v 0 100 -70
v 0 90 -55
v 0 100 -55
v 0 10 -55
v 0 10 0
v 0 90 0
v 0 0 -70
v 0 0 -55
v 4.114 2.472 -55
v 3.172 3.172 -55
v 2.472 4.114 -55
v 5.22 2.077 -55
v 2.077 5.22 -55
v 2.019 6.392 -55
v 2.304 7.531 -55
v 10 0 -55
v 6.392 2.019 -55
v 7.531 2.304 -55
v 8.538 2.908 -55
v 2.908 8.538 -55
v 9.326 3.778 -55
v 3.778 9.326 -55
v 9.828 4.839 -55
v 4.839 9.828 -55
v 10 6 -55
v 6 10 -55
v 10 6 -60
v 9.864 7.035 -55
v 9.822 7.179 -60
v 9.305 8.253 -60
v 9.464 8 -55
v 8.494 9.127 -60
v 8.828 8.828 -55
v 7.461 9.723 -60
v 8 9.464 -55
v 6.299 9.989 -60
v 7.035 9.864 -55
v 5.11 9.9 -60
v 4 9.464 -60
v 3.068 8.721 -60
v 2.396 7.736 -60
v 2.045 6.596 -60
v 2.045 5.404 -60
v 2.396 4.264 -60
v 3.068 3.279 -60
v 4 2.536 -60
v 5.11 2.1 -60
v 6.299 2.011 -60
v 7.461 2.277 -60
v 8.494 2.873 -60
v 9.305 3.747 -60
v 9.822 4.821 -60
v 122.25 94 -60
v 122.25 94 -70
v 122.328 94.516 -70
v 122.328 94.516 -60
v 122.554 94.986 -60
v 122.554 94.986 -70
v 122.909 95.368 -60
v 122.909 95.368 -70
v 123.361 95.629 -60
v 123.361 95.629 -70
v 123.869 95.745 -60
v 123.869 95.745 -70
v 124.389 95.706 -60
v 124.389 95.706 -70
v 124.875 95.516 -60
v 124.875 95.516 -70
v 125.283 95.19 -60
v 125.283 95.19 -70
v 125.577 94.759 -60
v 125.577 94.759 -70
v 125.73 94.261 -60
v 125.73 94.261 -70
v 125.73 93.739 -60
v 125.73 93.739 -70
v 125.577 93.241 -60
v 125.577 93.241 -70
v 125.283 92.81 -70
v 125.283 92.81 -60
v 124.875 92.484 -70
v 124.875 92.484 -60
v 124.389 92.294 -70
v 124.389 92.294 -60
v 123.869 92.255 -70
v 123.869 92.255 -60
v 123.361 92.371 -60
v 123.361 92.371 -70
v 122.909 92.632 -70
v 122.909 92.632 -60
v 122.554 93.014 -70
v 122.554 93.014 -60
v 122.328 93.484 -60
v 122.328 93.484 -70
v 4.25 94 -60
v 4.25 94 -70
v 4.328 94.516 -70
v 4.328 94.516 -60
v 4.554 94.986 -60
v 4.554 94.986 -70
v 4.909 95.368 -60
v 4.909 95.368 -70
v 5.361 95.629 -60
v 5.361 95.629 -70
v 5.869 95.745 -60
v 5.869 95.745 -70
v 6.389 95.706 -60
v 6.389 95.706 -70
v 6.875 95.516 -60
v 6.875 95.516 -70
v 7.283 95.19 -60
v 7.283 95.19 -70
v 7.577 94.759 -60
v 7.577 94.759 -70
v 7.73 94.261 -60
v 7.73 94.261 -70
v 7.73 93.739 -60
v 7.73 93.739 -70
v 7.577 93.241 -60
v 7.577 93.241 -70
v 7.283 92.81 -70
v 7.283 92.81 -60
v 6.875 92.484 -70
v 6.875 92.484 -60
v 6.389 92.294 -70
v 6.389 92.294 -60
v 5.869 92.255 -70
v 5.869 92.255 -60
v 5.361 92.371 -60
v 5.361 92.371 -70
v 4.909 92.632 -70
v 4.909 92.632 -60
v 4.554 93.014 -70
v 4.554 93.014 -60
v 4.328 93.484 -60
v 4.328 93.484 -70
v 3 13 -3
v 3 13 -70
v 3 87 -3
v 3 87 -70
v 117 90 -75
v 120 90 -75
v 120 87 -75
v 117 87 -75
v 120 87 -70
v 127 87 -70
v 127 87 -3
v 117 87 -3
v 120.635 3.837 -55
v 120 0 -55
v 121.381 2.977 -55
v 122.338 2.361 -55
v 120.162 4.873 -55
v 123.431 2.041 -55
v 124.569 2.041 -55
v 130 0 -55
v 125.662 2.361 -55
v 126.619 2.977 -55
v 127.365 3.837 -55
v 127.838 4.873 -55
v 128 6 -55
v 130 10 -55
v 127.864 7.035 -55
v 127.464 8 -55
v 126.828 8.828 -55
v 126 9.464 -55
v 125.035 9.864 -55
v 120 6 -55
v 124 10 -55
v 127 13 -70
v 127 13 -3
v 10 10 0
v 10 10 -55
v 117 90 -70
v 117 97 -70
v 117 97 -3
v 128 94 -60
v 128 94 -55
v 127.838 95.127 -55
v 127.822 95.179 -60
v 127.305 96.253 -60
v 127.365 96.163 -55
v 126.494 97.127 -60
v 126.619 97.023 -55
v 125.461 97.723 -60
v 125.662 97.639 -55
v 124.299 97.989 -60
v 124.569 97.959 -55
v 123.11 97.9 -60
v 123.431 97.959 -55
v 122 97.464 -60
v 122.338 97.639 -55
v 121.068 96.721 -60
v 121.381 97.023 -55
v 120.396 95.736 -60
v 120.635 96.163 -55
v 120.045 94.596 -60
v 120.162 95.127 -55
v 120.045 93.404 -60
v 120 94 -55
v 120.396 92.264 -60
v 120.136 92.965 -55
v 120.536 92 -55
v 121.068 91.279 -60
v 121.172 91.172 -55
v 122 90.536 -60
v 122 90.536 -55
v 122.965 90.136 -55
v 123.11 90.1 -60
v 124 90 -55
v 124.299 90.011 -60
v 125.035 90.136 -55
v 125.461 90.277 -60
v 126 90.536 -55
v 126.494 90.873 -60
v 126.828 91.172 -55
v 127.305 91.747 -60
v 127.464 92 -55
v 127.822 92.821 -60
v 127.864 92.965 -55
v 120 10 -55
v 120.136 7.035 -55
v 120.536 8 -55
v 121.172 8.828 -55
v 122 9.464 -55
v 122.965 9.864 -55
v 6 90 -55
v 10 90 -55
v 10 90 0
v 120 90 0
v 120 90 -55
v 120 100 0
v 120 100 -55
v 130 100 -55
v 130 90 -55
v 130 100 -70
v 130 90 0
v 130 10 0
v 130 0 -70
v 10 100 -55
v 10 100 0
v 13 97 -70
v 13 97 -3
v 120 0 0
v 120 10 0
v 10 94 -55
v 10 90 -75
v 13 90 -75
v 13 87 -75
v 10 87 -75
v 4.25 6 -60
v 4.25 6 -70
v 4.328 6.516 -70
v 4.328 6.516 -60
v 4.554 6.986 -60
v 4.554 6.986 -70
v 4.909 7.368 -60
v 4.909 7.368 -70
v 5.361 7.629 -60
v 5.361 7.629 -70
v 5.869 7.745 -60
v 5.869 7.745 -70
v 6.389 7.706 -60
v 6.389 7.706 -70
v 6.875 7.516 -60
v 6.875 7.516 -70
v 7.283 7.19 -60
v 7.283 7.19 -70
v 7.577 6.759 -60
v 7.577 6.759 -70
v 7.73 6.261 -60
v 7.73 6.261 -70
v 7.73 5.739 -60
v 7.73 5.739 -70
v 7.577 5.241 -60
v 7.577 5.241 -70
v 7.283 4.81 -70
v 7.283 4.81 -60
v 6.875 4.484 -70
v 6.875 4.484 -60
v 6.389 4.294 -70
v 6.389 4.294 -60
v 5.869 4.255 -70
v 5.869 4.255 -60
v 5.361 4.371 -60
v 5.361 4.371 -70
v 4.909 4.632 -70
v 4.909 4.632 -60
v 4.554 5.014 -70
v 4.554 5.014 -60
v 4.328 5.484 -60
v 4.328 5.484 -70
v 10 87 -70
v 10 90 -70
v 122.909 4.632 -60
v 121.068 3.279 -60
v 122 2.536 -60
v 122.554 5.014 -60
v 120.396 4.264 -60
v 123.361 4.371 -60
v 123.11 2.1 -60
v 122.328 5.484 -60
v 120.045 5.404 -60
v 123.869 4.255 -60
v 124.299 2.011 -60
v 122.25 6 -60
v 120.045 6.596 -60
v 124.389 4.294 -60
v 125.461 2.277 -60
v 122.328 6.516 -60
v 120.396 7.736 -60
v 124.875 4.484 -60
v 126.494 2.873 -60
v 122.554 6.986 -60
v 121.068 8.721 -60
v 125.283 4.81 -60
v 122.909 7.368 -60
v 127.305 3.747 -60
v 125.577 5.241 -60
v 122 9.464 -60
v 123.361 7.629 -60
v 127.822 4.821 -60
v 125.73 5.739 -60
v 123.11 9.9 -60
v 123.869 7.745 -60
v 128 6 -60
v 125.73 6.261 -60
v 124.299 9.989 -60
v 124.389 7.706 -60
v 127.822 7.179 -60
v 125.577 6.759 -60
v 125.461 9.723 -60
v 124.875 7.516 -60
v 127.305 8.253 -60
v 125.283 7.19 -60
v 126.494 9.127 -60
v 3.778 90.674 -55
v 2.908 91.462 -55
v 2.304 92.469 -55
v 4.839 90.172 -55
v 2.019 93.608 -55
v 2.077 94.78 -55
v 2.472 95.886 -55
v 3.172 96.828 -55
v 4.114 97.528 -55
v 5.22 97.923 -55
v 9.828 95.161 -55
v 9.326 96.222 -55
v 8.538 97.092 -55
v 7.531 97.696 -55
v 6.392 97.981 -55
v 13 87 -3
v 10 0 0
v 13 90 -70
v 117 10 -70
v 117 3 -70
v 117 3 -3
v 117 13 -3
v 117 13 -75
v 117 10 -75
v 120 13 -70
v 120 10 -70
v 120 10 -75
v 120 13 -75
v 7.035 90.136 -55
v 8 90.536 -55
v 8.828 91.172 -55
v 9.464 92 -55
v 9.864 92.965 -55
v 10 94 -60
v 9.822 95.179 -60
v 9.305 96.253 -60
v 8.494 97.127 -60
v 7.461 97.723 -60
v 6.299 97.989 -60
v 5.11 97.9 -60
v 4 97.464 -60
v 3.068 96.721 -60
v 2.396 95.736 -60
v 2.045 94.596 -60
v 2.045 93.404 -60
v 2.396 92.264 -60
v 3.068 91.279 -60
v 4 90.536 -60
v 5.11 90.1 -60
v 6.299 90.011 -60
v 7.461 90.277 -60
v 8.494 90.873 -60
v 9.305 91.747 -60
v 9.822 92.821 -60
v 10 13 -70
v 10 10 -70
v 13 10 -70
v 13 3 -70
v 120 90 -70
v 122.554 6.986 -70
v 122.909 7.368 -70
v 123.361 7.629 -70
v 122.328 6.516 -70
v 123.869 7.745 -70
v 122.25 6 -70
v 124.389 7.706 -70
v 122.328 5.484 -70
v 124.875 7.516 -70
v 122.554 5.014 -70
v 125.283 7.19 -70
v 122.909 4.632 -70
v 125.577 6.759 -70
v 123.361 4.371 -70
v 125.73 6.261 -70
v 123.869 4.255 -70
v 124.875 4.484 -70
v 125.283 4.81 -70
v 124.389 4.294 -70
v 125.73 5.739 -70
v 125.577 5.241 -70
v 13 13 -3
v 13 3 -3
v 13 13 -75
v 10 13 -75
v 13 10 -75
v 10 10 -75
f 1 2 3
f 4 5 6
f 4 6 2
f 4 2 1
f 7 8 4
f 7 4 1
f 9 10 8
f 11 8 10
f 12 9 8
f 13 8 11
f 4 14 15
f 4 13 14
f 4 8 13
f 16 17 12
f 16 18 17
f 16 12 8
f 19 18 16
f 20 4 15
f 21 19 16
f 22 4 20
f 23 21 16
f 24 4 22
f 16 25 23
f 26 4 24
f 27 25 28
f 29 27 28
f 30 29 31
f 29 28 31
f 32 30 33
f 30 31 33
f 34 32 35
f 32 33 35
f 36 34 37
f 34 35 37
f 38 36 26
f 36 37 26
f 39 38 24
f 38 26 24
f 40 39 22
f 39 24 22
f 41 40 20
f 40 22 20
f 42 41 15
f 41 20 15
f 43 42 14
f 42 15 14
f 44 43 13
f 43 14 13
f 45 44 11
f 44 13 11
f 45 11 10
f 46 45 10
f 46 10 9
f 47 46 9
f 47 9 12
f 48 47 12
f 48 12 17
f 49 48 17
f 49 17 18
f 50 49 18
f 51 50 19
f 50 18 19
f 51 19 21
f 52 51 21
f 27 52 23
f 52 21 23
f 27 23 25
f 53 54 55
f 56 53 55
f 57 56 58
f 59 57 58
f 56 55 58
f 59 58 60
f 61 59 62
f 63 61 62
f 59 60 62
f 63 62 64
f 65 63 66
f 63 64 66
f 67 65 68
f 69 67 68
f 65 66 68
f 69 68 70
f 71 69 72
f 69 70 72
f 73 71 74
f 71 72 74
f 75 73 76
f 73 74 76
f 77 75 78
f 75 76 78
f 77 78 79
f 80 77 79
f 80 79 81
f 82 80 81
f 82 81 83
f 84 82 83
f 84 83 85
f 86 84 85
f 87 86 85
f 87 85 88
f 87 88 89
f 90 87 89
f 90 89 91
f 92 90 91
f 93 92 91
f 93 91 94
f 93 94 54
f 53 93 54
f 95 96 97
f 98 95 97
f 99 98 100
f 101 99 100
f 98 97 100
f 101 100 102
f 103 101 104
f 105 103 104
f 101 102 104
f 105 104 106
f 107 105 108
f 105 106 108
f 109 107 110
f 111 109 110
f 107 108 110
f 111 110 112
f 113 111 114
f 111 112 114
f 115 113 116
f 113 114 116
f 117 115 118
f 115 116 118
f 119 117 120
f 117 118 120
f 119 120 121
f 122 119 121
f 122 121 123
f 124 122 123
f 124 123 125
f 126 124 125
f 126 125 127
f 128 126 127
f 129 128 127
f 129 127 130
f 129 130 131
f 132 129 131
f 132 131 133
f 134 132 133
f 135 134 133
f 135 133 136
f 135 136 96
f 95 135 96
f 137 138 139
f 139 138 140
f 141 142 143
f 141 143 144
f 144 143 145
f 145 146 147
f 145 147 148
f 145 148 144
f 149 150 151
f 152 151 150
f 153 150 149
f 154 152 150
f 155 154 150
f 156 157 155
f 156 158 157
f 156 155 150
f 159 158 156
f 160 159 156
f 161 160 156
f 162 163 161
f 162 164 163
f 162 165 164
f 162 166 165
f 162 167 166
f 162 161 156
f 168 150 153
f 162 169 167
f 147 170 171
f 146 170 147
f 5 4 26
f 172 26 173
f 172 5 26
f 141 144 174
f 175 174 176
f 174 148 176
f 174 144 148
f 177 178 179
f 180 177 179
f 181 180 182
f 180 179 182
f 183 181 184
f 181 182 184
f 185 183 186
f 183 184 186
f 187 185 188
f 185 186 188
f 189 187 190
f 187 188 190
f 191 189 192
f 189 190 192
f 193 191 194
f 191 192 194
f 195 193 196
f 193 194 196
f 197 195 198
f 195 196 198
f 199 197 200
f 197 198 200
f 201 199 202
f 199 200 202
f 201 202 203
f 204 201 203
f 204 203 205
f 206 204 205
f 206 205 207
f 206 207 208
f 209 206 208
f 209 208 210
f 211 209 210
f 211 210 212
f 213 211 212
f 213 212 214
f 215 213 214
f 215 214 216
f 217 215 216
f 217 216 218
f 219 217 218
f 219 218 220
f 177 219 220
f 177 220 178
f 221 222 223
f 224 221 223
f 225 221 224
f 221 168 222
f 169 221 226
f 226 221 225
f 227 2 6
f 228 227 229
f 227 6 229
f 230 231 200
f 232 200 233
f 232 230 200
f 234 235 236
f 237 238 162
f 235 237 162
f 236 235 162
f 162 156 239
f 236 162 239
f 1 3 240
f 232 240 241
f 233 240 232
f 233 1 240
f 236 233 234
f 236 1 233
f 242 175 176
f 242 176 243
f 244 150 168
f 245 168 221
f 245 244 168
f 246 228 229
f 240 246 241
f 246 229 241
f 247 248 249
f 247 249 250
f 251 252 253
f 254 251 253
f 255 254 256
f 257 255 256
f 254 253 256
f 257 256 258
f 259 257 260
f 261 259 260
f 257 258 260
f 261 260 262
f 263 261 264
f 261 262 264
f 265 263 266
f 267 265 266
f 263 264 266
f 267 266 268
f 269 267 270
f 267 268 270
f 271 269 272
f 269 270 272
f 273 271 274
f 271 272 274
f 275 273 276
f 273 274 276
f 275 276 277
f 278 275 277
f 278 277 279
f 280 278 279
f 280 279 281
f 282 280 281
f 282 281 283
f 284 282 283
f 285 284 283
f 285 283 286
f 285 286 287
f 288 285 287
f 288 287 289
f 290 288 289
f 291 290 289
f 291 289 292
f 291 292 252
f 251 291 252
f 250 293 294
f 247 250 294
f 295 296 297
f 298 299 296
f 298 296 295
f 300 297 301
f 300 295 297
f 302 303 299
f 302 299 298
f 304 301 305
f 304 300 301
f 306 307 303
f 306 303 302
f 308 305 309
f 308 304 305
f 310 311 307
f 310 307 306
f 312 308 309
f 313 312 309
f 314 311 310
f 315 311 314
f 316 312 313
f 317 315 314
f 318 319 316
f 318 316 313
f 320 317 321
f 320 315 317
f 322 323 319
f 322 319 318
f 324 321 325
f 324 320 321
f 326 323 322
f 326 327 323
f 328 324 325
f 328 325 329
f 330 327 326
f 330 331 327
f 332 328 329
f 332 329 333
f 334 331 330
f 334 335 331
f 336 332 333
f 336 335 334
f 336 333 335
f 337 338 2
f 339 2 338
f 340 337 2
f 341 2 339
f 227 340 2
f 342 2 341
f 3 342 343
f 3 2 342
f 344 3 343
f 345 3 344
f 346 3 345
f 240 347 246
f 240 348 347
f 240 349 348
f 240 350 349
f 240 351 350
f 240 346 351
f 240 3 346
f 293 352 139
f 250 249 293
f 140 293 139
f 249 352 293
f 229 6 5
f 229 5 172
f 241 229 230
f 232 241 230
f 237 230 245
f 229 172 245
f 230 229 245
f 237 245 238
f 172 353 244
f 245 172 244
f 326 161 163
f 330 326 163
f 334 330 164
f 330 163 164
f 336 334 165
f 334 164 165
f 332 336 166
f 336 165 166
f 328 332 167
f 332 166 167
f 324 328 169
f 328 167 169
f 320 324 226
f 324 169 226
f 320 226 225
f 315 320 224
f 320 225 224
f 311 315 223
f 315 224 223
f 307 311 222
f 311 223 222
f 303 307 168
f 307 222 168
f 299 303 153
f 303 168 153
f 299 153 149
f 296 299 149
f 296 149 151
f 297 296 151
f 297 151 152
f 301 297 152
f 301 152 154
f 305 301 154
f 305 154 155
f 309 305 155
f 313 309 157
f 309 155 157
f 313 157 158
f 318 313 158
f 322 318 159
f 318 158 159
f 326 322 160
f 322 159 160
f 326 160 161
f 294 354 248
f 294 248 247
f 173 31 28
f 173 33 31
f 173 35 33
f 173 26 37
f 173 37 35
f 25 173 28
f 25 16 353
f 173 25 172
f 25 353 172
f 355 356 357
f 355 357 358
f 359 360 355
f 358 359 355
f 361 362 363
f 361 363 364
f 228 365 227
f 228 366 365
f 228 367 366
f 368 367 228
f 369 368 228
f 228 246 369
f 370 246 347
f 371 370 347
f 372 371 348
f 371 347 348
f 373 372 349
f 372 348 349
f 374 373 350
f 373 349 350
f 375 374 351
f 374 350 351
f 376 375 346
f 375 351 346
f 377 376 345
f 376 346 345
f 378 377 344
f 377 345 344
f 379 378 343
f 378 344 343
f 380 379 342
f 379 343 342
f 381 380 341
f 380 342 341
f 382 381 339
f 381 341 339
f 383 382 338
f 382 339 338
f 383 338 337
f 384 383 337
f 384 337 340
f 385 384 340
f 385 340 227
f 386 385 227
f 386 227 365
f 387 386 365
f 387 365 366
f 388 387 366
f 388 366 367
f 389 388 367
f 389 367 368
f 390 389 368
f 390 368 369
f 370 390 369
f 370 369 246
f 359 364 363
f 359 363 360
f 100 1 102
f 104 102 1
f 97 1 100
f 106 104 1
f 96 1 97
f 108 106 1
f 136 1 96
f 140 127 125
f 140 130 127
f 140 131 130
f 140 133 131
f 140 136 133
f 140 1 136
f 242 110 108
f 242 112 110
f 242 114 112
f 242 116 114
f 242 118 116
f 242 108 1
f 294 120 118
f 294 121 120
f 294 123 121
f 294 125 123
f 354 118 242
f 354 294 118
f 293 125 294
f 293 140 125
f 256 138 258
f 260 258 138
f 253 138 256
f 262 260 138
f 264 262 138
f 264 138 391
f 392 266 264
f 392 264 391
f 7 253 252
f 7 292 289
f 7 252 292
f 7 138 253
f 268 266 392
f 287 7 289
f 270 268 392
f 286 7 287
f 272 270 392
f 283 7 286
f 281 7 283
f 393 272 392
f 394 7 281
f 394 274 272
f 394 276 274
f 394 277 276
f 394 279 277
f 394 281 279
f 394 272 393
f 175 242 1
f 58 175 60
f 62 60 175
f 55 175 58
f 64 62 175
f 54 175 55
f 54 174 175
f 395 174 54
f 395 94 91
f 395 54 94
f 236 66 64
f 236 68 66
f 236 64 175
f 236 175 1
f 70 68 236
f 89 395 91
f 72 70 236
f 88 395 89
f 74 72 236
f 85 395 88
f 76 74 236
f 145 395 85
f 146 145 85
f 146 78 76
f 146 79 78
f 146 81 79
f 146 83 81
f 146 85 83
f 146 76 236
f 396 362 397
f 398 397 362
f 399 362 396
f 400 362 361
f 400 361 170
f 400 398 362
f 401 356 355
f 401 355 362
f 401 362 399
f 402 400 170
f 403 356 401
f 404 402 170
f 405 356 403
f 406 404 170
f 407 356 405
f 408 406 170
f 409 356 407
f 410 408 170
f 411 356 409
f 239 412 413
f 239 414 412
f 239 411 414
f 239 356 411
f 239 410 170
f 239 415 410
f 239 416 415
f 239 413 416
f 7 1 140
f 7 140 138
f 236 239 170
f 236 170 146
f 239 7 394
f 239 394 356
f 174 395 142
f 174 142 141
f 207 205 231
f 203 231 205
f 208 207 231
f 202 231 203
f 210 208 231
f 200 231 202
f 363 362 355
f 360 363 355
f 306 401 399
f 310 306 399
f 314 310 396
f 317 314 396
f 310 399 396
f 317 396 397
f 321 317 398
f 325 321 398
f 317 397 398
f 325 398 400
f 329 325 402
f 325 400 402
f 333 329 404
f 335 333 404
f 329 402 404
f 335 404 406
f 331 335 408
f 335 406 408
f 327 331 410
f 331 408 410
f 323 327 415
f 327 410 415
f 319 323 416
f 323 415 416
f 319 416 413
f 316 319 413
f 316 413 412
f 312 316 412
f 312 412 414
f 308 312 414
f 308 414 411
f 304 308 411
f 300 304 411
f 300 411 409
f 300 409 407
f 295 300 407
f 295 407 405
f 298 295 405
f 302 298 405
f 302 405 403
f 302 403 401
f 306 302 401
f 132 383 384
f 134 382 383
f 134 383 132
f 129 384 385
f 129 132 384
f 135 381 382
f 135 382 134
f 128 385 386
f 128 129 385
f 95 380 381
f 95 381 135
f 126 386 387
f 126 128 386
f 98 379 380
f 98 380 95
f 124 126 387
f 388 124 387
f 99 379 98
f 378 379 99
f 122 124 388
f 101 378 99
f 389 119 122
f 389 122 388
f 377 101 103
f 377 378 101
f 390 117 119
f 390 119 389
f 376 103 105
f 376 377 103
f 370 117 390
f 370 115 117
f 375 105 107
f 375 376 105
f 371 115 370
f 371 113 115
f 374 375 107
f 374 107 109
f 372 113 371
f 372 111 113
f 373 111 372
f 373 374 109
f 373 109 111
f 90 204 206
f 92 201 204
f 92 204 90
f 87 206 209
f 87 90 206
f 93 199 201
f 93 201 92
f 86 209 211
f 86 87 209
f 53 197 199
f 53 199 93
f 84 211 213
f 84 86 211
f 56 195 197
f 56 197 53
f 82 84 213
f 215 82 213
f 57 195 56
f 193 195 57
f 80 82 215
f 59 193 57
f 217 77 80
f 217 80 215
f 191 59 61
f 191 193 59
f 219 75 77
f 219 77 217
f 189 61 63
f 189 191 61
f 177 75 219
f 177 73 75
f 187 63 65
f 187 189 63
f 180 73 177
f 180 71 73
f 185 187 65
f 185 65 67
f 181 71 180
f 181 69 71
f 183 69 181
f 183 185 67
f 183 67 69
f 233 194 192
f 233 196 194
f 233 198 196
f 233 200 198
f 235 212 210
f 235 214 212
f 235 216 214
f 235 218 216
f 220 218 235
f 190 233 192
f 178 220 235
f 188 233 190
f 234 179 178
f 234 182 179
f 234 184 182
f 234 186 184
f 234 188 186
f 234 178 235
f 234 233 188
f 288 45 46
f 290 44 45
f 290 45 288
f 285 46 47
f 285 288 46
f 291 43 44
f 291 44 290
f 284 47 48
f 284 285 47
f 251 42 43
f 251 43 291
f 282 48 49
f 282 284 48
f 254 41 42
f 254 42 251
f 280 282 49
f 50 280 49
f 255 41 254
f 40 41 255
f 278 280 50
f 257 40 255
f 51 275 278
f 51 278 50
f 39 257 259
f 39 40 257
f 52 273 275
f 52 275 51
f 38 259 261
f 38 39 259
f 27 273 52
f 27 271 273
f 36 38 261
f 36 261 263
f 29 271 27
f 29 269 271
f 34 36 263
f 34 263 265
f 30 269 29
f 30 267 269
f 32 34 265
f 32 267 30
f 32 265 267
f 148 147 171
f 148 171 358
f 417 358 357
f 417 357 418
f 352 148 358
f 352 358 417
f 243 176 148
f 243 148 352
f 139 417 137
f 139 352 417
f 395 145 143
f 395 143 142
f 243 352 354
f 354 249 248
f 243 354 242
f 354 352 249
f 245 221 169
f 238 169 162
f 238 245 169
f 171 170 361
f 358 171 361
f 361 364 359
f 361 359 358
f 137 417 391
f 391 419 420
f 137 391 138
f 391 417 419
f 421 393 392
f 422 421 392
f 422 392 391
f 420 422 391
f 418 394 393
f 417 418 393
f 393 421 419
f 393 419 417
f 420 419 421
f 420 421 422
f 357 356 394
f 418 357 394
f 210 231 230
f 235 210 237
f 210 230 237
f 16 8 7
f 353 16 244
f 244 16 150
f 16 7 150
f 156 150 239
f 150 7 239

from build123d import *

# Parameters (mm, degrees)
SKETCH2_W           = 130
SKETCH2_H           = 70
BOSS_EXTRUDE1_DEPTH = 100
SKETCH3_W           = 104
SKETCH3_H           = 74
CUT_EXTRUDE1_DEPTH  = 67
SKETCH4_W           = 10
SKETCH4_H           = 10
CUT_EXTRUDE2_DEPTH  = 55
SKETCH5_W           = 104
SKETCH5_H           = 10
CUT_EXTRUDE3_DEPTH  = 67
SKETCH6_W           = 10
SKETCH6_H           = 74
CUT_EXTRUDE4_DEPTH  = 67
SKETCH9_R           = 1.75
CUT_EXTRUDE5_DEPTH  = 67
SKETCH10_R          = 4
CUT_EXTRUDE6_DEPTH  = 5
SKETCH12_R          = 4
CUT_EXTRUDE7_DEPTH  = 5
SKETCH13_R          = 4
CUT_EXTRUDE8_DEPTH  = 5
SKETCH14_R          = 4
CUT_EXTRUDE9_DEPTH  = 5
SKETCH15_W          = 3
SKETCH15_H          = 3
BOSS_EXTRUDE2_DEPTH = 5


with BuildPart() as part:
    # Sketch2 → Boss-Extrude1 (new body)
    with BuildSketch(Plane(origin=(0, 0, 0), x_dir=(1, 0, 0), z_dir=(0, 1, 0))):
        with Locations((65, 35)):
            Rectangle(SKETCH2_W, SKETCH2_H)
    extrude(amount=BOSS_EXTRUDE1_DEPTH)

    # Sketch3 → Cut-Extrude1 (cut)
    with BuildSketch(Plane(origin=(0, 0, -70), x_dir=(-1, 0, 0), z_dir=(0, 0, -1))):
        with Locations((-65, 50)):
            Rectangle(SKETCH3_W, SKETCH3_H)
    extrude(amount=-CUT_EXTRUDE1_DEPTH, mode=Mode.SUBTRACT)

    # Sketch4 → Cut-Extrude2 (cut)
    with BuildSketch(Plane.XY):
        with Locations((5, 95)):
            Rectangle(SKETCH4_W, SKETCH4_H)
        with Locations((125, 95)):
            Rectangle(SKETCH4_W, SKETCH4_H)
        with Locations((5, 5)):
            Rectangle(SKETCH4_W, SKETCH4_H)
        with Locations((125, 5)):
            Rectangle(SKETCH4_W, SKETCH4_H)
    extrude(amount=-CUT_EXTRUDE2_DEPTH, mode=Mode.SUBTRACT)

    # Sketch5 → Cut-Extrude3 (cut)
    with BuildSketch(Plane(origin=(0, 0, -70), x_dir=(-1, 0, 0), z_dir=(0, 0, -1))):
        with Locations((-65, 92)):
            Rectangle(SKETCH5_W, SKETCH5_H)
        with Locations((-65, 8)):
            Rectangle(SKETCH5_W, SKETCH5_H)
    extrude(amount=-CUT_EXTRUDE3_DEPTH, mode=Mode.SUBTRACT)

    # Sketch6 → Cut-Extrude4 (cut)
    with BuildSketch(Plane(origin=(0, 0, -70), x_dir=(-1, 0, 0), z_dir=(0, 0, -1))):
        with Locations((-122, 50)):
            Rectangle(SKETCH6_W, SKETCH6_H)
        with Locations((-8, 50)):
            Rectangle(SKETCH6_W, SKETCH6_H)
    extrude(amount=-CUT_EXTRUDE4_DEPTH, mode=Mode.SUBTRACT)

    # Sketch9 → Cut-Extrude5 (cut)
    with BuildSketch(Plane(origin=(0, 0, -70), x_dir=(-1, 0, 0), z_dir=(0, 0, -1))):
        with Locations((-124, 94)):
            Circle(SKETCH9_R)
        with Locations((-124, 6)):
            Circle(SKETCH9_R)
        with Locations((-6, 94)):
            Circle(SKETCH9_R)
        with Locations((-6, 6)):
            Circle(SKETCH9_R)
    extrude(amount=-CUT_EXTRUDE5_DEPTH, mode=Mode.SUBTRACT)

    # Sketch10 → Cut-Extrude6 (cut)
    with BuildSketch(Plane.XY.offset(-55)):
        with Locations((124, 94)):
            Circle(SKETCH10_R)
    extrude(amount=-CUT_EXTRUDE6_DEPTH, mode=Mode.SUBTRACT)

    # Sketch12 → Cut-Extrude7 (cut)
    with BuildSketch(Plane.XY.offset(-55)):
        with Locations((124, 6)):
            Circle(SKETCH12_R)
    extrude(amount=-CUT_EXTRUDE7_DEPTH, mode=Mode.SUBTRACT)

    # Sketch13 → Cut-Extrude8 (cut)
    with BuildSketch(Plane.XY.offset(-55)):
        with Locations((6, 6)):
            Circle(SKETCH13_R)
    extrude(amount=-CUT_EXTRUDE8_DEPTH, mode=Mode.SUBTRACT)

    # Sketch14 → Cut-Extrude9 (cut)
    with BuildSketch(Plane.XY.offset(-55)):
        with Locations((6, 94)):
            Circle(SKETCH14_R)
    extrude(amount=-CUT_EXTRUDE9_DEPTH, mode=Mode.SUBTRACT)

    # Sketch15 → Boss-Extrude2 (add)
    with BuildSketch(Plane(origin=(0, 0, -70), x_dir=(-1, 0, 0), z_dir=(0, 0, -1))):
        with Locations((-118.5, 88.5)):
            Rectangle(SKETCH15_W, SKETCH15_H)
        with Locations((-118.5, 11.5)):
            Rectangle(SKETCH15_W, SKETCH15_H)
        with Locations((-11.5, 11.5)):
            Rectangle(SKETCH15_W, SKETCH15_H)
        with Locations((-11.5, 88.5)):
            Rectangle(SKETCH15_W, SKETCH15_H)
    extrude(amount=BOSS_EXTRUDE2_DEPTH)


solid = part.part
